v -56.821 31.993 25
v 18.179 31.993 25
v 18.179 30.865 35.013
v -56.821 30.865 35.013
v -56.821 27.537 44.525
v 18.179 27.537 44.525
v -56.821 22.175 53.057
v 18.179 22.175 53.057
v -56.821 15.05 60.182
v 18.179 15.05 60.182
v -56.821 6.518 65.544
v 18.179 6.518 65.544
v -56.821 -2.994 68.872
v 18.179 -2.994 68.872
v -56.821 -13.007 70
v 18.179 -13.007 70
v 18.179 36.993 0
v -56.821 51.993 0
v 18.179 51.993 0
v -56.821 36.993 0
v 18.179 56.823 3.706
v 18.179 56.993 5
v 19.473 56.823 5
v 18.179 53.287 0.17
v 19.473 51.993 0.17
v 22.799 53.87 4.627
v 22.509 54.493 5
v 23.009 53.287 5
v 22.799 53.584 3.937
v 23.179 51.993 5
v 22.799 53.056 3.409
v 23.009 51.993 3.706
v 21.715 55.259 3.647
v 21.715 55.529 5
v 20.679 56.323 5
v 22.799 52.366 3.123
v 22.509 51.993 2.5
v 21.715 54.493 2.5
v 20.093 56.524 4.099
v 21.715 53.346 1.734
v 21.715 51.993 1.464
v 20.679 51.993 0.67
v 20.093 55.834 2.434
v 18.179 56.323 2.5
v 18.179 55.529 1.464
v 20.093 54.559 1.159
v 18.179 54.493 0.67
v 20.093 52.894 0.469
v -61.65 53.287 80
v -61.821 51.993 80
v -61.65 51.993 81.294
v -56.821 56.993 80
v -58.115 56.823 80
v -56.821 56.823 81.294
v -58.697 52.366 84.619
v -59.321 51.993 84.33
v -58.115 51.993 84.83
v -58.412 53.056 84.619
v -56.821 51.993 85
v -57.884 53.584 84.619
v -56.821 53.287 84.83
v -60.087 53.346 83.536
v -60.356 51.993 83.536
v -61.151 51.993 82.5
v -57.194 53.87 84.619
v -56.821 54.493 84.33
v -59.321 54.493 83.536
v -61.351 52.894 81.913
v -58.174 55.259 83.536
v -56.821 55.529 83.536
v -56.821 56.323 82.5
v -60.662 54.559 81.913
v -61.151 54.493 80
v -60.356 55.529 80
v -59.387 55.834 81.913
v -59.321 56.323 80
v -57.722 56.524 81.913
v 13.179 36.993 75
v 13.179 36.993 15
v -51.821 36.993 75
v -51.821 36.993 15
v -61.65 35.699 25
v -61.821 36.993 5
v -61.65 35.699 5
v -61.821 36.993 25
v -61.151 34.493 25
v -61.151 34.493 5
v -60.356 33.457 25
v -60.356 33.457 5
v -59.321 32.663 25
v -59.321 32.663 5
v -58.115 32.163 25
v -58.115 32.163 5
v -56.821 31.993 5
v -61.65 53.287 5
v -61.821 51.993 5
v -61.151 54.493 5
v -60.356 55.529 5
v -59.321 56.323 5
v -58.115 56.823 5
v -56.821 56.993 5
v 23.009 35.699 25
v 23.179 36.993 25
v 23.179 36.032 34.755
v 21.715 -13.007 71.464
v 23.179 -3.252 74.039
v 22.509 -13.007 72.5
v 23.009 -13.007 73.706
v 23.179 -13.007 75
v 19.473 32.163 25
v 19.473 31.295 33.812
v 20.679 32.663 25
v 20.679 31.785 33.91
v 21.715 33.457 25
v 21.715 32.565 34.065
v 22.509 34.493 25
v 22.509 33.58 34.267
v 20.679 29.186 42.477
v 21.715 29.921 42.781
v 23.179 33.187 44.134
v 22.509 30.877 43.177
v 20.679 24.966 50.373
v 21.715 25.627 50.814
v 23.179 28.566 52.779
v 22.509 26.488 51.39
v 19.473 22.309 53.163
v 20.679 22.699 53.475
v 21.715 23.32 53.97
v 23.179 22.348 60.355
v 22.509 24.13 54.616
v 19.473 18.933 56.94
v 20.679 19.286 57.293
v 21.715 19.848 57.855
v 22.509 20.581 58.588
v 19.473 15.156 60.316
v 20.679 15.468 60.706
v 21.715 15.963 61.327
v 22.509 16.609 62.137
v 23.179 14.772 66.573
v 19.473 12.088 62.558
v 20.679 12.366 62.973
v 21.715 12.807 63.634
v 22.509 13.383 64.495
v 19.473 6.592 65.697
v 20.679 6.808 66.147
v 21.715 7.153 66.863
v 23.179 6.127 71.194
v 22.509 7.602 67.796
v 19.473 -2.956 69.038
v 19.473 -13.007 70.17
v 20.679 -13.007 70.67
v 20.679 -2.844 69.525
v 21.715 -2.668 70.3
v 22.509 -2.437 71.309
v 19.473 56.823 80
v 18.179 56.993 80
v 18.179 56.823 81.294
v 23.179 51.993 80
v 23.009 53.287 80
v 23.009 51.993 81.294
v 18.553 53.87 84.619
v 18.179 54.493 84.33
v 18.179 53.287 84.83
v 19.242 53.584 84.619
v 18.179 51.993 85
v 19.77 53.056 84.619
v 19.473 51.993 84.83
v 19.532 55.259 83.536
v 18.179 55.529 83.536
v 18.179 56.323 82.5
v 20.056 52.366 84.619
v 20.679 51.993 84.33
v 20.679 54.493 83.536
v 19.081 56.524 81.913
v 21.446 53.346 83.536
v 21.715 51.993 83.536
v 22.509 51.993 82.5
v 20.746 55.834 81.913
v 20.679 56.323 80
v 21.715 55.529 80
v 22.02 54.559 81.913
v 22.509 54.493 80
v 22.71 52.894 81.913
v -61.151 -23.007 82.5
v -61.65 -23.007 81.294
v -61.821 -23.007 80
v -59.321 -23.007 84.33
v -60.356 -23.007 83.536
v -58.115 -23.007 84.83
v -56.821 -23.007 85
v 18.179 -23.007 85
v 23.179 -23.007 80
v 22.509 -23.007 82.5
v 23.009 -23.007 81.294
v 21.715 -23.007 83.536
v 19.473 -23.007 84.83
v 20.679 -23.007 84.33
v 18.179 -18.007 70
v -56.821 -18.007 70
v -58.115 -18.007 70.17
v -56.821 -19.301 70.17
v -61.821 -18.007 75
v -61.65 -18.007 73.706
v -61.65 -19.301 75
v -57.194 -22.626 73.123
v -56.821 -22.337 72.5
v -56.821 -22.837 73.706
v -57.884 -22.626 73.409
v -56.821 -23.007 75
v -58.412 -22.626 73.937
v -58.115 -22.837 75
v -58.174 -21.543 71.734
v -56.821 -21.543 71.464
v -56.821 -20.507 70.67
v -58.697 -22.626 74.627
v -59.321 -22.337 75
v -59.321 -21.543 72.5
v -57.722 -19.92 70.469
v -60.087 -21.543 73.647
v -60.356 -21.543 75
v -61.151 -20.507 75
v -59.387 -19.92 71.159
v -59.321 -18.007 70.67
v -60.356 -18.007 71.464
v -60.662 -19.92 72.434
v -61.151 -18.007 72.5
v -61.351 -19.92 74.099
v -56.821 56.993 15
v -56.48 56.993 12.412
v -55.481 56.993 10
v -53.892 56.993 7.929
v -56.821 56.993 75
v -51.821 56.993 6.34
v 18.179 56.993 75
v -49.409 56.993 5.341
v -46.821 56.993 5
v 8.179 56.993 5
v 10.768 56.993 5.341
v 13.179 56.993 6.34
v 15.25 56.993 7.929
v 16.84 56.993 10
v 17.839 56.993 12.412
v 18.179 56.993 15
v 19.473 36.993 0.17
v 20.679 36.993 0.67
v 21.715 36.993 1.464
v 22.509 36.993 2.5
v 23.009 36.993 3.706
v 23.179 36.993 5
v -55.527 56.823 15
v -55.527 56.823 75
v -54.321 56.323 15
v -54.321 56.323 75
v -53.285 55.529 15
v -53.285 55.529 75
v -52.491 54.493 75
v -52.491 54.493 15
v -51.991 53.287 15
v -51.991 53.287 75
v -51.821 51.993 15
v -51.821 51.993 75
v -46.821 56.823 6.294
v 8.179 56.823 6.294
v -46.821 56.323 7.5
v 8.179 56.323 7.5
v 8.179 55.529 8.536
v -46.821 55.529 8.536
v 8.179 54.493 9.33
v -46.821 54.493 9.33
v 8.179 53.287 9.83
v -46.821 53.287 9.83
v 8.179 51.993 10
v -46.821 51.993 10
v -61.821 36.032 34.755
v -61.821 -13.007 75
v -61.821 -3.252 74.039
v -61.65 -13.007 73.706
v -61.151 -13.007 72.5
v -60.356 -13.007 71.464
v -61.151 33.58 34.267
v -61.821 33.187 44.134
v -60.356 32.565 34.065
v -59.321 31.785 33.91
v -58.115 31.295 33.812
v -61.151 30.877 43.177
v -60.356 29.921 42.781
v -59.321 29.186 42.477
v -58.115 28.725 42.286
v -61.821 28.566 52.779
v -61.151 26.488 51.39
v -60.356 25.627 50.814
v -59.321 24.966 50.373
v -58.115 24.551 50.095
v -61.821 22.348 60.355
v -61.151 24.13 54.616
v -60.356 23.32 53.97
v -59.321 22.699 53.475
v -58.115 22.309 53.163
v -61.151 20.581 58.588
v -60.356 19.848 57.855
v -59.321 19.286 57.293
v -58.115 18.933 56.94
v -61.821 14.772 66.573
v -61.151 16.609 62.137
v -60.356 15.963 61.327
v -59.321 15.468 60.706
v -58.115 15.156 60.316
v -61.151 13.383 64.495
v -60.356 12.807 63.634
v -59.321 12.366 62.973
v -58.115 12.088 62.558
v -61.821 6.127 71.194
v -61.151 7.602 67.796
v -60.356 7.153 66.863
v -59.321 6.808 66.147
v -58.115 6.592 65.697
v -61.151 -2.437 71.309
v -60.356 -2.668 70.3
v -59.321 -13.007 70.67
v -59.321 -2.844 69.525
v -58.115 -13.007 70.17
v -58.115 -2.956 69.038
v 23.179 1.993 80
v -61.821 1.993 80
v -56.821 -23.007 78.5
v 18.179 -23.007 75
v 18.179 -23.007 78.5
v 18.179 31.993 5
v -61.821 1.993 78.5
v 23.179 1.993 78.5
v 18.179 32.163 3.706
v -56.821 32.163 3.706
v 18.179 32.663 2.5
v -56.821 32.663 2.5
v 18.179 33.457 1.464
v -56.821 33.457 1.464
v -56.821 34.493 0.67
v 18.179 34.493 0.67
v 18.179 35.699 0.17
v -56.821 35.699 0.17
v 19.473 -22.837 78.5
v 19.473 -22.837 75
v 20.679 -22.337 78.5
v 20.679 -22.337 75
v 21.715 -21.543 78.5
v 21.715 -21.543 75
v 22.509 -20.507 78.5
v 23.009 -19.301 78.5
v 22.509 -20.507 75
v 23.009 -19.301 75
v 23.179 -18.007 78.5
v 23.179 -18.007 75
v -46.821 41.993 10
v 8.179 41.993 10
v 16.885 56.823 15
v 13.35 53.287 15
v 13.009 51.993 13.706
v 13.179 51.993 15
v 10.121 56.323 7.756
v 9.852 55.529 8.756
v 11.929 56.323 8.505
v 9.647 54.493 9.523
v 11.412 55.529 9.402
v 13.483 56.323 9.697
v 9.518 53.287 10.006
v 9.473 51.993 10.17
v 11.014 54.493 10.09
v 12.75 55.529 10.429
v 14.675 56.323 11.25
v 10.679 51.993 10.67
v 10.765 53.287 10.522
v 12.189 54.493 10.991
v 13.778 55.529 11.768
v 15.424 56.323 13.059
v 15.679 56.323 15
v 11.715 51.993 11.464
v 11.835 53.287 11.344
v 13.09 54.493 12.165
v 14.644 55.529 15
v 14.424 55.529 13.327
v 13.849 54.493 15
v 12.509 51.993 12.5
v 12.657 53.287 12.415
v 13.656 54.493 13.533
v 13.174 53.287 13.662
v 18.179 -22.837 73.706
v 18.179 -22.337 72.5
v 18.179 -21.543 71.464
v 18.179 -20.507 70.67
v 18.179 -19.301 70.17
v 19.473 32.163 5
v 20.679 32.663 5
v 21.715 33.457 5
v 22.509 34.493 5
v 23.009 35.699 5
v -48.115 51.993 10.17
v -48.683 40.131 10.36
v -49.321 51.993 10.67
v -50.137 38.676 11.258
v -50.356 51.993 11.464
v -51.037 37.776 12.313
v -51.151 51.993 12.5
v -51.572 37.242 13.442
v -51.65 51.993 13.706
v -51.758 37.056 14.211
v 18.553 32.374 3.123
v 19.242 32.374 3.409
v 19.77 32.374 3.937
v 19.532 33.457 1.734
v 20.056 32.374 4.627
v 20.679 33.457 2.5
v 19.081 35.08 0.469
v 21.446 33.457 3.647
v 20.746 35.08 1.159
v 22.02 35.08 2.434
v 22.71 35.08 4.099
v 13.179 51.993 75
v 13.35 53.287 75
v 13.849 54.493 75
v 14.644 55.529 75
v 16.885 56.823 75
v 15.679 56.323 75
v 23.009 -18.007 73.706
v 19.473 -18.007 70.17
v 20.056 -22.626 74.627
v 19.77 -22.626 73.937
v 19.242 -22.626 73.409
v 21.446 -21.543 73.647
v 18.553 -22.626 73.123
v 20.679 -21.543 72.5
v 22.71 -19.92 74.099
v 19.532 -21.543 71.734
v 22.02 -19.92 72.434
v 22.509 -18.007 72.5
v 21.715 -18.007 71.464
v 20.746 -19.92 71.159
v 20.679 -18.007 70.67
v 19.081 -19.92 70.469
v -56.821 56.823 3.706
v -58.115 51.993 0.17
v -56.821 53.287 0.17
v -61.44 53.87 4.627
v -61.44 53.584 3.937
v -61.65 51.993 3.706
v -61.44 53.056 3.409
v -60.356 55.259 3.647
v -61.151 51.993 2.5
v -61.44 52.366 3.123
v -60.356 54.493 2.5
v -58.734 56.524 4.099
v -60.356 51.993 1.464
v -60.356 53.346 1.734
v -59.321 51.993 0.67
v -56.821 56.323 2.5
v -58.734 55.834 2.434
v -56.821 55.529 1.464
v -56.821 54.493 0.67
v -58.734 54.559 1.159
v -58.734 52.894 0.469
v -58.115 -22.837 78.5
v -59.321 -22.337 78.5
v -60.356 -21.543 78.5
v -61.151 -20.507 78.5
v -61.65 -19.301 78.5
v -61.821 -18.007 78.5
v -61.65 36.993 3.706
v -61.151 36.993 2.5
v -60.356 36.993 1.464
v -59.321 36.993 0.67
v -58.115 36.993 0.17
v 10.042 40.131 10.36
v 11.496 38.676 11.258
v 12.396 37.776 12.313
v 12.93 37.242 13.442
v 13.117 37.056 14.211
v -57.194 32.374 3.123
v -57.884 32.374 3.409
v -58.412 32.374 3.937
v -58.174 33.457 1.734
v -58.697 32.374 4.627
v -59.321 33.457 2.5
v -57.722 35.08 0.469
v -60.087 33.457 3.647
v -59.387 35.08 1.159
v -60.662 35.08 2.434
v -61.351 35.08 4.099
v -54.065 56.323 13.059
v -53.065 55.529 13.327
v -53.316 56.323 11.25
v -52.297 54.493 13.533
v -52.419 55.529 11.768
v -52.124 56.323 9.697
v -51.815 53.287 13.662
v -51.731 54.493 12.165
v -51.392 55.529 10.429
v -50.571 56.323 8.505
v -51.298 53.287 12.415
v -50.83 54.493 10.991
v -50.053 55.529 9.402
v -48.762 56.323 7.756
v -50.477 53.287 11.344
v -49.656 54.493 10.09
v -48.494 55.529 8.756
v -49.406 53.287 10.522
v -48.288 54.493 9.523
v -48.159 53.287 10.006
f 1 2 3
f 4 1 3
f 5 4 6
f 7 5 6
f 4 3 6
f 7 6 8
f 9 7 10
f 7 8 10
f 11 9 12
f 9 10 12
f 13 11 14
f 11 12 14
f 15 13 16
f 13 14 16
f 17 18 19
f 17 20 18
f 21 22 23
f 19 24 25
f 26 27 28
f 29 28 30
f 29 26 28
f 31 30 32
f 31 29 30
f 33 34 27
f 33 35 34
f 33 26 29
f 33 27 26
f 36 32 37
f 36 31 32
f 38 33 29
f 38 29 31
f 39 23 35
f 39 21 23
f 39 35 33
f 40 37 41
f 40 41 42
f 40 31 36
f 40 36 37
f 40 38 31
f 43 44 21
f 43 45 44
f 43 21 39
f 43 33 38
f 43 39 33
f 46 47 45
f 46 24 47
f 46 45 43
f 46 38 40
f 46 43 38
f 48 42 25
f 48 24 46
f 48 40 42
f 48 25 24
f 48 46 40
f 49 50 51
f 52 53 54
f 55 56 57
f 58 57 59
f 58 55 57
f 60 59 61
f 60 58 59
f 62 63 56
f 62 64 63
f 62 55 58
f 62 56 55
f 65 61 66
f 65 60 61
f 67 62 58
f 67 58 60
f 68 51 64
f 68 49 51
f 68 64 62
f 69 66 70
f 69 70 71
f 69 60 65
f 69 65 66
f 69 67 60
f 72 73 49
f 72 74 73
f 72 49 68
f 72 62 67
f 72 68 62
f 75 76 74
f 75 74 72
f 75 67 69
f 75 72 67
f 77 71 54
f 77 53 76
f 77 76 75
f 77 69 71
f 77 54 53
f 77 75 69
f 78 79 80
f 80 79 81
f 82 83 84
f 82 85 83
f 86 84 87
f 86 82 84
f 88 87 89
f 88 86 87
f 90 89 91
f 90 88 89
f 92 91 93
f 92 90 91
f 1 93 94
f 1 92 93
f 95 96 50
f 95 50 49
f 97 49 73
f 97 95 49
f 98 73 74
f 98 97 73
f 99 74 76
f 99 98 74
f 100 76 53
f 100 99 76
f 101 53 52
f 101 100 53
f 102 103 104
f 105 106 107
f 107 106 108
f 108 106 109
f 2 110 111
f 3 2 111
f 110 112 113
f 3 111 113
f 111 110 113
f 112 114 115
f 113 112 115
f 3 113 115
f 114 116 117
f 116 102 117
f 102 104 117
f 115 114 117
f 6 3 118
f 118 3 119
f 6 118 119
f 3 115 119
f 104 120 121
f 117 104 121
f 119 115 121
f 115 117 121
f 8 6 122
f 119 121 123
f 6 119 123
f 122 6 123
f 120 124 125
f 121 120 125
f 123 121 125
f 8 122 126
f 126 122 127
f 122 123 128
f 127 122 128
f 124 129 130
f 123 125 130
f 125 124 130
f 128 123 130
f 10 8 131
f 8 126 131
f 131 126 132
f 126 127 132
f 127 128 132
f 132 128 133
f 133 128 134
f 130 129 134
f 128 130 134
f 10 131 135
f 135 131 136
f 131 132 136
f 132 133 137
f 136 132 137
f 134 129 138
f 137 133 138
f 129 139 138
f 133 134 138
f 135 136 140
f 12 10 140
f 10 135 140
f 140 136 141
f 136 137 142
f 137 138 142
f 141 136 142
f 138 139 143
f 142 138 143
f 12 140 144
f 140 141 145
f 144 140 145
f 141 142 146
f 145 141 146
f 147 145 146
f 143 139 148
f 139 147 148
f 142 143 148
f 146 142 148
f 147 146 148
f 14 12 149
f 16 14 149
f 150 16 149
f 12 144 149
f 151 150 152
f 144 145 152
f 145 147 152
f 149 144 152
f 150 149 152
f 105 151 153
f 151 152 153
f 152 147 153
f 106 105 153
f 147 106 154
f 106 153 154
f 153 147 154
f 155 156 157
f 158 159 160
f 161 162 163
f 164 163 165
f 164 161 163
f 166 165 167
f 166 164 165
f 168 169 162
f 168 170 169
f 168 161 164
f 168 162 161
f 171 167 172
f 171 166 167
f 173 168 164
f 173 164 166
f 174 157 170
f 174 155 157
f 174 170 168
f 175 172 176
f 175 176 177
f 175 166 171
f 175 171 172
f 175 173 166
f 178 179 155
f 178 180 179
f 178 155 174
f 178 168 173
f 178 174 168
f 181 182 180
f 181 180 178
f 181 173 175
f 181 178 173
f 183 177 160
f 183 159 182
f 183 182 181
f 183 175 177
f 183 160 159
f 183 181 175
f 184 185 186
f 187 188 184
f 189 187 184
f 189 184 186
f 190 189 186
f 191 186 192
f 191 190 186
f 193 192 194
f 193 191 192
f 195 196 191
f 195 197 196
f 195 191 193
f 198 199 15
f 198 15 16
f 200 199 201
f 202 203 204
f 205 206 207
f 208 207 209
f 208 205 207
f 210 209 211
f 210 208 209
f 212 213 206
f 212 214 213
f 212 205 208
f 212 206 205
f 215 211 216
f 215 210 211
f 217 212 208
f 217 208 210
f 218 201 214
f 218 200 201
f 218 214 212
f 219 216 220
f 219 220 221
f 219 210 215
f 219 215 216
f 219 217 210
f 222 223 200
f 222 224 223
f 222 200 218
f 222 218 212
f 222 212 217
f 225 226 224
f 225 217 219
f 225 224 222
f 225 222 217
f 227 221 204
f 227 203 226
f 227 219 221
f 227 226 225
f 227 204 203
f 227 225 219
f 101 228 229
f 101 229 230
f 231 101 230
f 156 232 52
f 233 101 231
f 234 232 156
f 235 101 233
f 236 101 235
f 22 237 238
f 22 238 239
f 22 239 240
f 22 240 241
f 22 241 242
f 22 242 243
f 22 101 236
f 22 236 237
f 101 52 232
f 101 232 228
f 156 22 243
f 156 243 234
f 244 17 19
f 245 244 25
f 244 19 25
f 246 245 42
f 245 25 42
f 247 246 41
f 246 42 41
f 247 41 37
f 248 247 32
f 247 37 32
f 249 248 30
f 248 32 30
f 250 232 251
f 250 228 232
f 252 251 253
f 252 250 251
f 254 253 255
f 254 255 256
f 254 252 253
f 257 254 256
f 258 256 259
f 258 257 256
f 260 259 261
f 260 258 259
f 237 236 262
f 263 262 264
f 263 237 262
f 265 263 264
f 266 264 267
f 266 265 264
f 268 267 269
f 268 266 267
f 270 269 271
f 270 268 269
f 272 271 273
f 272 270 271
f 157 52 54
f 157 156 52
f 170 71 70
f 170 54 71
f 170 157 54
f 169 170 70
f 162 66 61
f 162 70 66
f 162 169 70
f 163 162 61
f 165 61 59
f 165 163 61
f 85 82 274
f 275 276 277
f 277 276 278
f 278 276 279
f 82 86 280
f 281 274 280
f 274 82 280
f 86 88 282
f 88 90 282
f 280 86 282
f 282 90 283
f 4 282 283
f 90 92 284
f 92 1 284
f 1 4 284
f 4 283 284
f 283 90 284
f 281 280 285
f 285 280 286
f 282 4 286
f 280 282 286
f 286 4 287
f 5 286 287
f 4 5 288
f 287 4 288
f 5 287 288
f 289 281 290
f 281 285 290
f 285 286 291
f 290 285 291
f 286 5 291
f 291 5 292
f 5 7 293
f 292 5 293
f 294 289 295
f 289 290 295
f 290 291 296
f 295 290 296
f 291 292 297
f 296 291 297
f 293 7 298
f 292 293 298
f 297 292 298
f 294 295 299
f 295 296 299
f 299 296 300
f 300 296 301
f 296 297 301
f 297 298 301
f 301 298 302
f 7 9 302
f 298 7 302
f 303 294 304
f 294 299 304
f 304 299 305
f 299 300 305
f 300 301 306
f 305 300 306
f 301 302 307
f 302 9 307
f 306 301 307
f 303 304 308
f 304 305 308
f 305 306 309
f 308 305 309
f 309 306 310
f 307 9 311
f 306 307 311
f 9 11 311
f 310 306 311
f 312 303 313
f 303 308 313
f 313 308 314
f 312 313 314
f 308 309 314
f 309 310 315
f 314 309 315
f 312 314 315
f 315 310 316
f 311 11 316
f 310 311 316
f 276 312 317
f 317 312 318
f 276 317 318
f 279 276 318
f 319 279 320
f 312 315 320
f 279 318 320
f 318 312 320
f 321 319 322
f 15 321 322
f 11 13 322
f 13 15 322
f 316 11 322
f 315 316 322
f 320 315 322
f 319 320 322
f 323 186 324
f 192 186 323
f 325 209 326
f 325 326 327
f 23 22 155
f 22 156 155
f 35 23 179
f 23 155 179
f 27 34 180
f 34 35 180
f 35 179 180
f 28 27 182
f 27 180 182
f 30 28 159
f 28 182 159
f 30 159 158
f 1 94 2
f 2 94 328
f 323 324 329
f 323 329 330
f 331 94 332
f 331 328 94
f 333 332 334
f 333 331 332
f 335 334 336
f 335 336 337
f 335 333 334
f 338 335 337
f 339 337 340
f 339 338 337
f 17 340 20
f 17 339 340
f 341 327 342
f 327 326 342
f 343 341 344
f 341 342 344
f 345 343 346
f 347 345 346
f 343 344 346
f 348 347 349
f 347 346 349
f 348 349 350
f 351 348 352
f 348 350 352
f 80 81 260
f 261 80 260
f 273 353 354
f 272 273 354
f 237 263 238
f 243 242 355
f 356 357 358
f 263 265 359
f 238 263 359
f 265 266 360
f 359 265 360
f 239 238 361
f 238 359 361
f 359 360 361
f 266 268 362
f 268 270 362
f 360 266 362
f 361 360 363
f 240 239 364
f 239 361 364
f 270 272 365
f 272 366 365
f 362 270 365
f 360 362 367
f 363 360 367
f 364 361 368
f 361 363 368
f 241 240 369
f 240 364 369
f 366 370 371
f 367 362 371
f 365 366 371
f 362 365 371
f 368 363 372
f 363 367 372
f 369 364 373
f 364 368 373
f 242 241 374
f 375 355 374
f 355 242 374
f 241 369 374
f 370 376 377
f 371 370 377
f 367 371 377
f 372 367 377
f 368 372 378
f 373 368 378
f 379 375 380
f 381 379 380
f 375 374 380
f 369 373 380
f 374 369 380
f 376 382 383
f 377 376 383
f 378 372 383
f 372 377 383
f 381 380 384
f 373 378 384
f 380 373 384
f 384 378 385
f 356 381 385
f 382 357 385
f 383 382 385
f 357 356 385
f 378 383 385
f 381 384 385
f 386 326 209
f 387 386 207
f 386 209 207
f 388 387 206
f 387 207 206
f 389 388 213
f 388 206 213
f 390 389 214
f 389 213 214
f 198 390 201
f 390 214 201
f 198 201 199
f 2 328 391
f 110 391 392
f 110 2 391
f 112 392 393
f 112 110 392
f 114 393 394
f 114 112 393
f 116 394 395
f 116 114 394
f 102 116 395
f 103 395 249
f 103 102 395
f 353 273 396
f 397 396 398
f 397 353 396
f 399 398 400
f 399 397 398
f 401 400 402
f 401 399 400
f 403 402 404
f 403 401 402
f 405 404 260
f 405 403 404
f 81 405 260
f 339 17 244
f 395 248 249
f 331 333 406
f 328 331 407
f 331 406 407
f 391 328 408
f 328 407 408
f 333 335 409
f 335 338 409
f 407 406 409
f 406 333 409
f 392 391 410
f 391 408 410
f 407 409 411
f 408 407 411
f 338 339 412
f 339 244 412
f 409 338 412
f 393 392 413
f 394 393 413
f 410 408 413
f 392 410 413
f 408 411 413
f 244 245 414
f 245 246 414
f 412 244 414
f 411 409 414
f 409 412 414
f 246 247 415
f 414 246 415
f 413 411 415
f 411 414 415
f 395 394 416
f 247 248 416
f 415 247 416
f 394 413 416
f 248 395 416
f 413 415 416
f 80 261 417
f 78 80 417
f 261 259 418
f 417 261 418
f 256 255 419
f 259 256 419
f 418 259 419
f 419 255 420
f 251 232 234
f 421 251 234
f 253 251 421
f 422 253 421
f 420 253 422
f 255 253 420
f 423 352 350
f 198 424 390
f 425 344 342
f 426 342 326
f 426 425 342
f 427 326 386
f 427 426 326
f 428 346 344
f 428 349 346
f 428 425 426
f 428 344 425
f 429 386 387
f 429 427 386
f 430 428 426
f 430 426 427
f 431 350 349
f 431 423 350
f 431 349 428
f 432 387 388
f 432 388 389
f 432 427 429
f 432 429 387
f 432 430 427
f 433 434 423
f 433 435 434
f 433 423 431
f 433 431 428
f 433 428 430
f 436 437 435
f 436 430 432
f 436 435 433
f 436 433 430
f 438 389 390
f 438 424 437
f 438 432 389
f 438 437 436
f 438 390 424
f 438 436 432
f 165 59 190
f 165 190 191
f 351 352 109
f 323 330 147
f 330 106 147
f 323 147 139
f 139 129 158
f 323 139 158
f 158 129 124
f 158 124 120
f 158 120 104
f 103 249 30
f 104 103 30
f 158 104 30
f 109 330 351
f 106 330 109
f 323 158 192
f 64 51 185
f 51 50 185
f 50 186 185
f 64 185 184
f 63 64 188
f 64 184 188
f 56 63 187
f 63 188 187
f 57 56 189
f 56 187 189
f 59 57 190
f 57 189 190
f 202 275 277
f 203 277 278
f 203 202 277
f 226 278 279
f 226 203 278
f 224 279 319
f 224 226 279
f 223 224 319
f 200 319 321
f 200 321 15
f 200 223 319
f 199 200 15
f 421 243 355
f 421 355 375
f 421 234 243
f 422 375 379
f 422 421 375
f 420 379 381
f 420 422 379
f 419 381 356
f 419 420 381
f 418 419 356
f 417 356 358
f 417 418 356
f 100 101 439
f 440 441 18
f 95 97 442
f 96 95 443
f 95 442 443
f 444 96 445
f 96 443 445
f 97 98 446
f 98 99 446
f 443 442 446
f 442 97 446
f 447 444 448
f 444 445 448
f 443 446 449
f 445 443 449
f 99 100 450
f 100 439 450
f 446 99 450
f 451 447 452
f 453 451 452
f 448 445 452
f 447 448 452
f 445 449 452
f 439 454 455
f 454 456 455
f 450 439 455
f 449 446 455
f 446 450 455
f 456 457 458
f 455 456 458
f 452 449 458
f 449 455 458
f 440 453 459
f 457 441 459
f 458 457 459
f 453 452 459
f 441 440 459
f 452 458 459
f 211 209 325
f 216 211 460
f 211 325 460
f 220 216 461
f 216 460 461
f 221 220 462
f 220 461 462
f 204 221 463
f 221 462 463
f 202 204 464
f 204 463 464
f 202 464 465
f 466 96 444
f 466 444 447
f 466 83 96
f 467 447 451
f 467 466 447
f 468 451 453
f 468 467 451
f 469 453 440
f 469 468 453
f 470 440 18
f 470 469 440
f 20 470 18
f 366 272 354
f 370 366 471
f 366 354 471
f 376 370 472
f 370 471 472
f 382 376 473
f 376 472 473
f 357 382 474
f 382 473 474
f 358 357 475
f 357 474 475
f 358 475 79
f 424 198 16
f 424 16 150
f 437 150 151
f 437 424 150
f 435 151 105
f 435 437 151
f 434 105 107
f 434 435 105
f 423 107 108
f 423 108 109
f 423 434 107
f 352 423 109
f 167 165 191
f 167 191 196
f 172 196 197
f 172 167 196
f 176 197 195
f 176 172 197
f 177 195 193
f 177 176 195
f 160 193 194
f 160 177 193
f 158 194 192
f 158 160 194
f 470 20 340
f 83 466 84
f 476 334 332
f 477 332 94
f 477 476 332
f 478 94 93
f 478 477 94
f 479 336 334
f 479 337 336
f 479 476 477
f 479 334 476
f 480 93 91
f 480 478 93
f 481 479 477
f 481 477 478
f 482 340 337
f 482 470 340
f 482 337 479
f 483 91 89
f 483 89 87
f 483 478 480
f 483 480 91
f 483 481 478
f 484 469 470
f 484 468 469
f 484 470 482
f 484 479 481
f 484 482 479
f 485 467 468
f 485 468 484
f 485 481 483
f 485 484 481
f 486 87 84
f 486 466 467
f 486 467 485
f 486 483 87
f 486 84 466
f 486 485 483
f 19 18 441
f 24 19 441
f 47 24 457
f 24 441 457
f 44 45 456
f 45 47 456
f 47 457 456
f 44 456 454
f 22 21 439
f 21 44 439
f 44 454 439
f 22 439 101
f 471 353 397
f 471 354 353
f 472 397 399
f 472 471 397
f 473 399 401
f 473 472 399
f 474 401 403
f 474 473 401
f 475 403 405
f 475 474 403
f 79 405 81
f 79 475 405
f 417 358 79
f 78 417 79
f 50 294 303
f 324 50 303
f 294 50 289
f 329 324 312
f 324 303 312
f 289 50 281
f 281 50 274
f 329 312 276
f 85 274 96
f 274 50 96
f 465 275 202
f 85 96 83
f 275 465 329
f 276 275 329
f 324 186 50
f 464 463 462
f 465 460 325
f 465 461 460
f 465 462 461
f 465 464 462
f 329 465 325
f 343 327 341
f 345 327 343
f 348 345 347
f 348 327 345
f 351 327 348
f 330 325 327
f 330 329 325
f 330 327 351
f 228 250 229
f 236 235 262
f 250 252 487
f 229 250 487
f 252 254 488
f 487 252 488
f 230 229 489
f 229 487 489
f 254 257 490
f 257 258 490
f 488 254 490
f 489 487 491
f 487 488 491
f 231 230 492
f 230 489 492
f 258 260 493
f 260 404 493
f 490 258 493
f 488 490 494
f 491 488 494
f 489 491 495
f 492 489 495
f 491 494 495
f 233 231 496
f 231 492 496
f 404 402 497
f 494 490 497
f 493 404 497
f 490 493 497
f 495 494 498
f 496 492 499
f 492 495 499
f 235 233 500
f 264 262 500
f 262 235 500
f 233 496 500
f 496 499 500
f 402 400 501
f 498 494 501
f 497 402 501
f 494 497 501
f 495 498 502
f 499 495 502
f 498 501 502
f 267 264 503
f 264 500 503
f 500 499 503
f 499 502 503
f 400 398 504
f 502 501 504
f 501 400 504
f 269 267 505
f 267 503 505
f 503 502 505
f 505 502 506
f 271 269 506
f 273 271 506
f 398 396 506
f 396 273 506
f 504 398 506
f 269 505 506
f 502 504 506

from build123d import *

# Parameters (mm, degrees)
F1_DEPTH  = 60
F2_DEPTH  = 85
F3_W      = 65
F3_H      = 20
F4_DEPTH  = 10
F5_W      = 65
F5_H      = 20
F6_DEPTH  = 10
F9_W      = 85
F9_H      = 25
F10_DEPTH = 1.5
F11_F1_R  = 5
F11_F2_R  = 5
F12_W     = 85
F12_H     = 60
F13_DEPTH = 70
F14_R     = 45
F15_R     = 4.99999
F16_R     = 4.99999
F17_W     = 85
F17_H     = 1.5
F18_DEPTH = 5
F19_W     = 85
F19_H     = 5
F20_DEPTH = 5
F21_W     = 5
F21_H     = 10
F22_DEPTH = 85
F23_R     = 4.99999


# Not quite as in the source:
# - a fillet or chamfer is up to 0.001 mm smaller than in the source, because OpenCascade refuses the exact size


with BuildPart() as f1:
    # F0 (on Top) → F1 (new body)
    with BuildSketch(Plane.XY):
        Polygon((-61.8206309527, 56.9930104911), (-61.8206309527, -28.0069895089), (23.1793690473, -28.0069895089), (23.1793690473, 56.9930104911), (13.1793690473, 56.9930104911), (13.1793690473, 36.9930104911), (-51.8206309527, 36.9930104911), (-51.8206309527, 56.9930104911), align=None)
    extrude(amount=F1_DEPTH)

    # F0 (on Top) → F2 (join)
    with BuildSketch(Plane.XY):
        Polygon((-61.8206309527, 56.9930104911), (-61.8206309527, -28.0069895089), (23.1793690473, -28.0069895089), (23.1793690473, 56.9930104911), (13.1793690473, 56.9930104911), (13.1793690473, 36.9930104911), (-51.8206309527, 36.9930104911), (-51.8206309527, 56.9930104911), align=None)
    extrude(amount=F2_DEPTH)

    # F3 (on face) → F4 (join)
    with BuildSketch(Plane.XY.offset(85)):
        with Locations((-19.3206309527, 46.9930104911)):
            Rectangle(F3_W, F3_H)
    extrude(amount=-F4_DEPTH)

    # F5 (on face) → F6 (join)
    with BuildSketch(Plane(origin=(0, 0, 0), x_dir=(1, 0, 0), z_dir=(0, 0, -1))):
        with Locations((-19.3206309527, -46.9930104911)):
            Rectangle(F5_W, F5_H)
    extrude(amount=-F6_DEPTH)

    # F9 (on offset) → F10 (cut)
    with BuildSketch(Plane.XY.offset(80)):
        with Locations((-19.3206309527, -15.5069895089)):
            Rectangle(F9_W, F9_H)
    extrude(amount=-F10_DEPTH, mode=Mode.SUBTRACT)

    # F11: fillet of radius 5 on 4 edges, made by hand

    # F11_f1
    f11_f1_edges = [f1.edges().sort_by_distance(p)[0] for p in [
        (13.1793690473, 46.9930104911, 10),
        (-19.3206309527, 36.9930104911, 10),
        (-51.8206309527, 46.9930104911, 10),
    ]]
    fillet(f11_f1_edges, radius=F11_F1_R)

    # F11_f2
    f11_f2_edges = [f1.edges().sort_by_distance(p)[0] for p in [
        (-19.3206309527, 56.9930104911, 10),
        (-50.3561648586, 56.9930104911, 11.4644660941),
        (11.7149029532, 56.9930104911, 11.4644660941),
    ]]
    fillet(f11_f2_edges, radius=F11_F2_R)

    # F12 (on face) → F13 (cut)
    with BuildSketch(Plane(origin=(0, 0, 0), x_dir=(1, 0, 0), z_dir=(0, 0, -1))):
        with Locations((-19.3206309527, -1.9930104911)):
            Rectangle(F12_W, F12_H)
    extrude(amount=-F13_DEPTH, mode=Mode.SUBTRACT)

    # F14
    f14_edges = [f1.edges().sort_by_distance(p)[0] for p in [
        (-19.320631, 31.99301, 70),
    ]]
    fillet(f14_edges, radius=F14_R)

    # F15 (radius 5 in the source; OpenCascade refuses exactly that, so slightly less here)
    f15_edges = [f1.edges().sort_by_distance(p)[0] for p in [
        (-19.320631, 56.99301, 0),
        (-61.820631, 56.99301, 42.5),
        (23.179369, 56.99301, 42.5),
        (-61.820631, 44.49301, 0),
        (23.179369, 44.49301, 0),
        (-19.320631, 31.99301, 0),
        (-61.820631, -20.50699, 70),
        (23.179369, 18.812816, 56.819805),
        (-61.820631, 31.99301, 12.5),
        (-61.820631, 18.812816, 56.819805),
        (-61.820631, 14.49301, 85),
        (23.179369, 31.99301, 12.5),
        (23.179369, -20.50699, 70),
        (-19.320631, 56.99301, 85),
        (23.179369, 14.49301, 85),
    ]]
    fillet(f15_edges, radius=F15_R)

    # F16 (radius 5 in the source; OpenCascade refuses exactly that, so slightly less here)
    f16_edges = [f1.edges().sort_by_distance(p)[0] for p in [
        (-19.320631, 51.99302, 0),
        (18.179379, 44.49301, 0),
        (-56.820641, 44.49301, 0),
        (-19.320631, 36.993, 0),
        (-19.320631, -28.00699, 70),
    ]]
    fillet(f16_edges, radius=F16_R)

    # F17 (on face) → F18 (cut)
    with BuildSketch(Plane.XZ.offset(3.0069895089)):
        with Locations((-19.3206309527, 79.25)):
            Rectangle(F17_W, F17_H)
    extrude(amount=-F18_DEPTH, mode=Mode.SUBTRACT)

    # F19 (on face) → F20 (cut)
    with BuildSketch(Plane.XZ.offset(28.0069895089)):
        with Locations((-19.3206309527, 82.5)):
            Rectangle(F19_W, F19_H)
    extrude(amount=-F20_DEPTH, mode=Mode.SUBTRACT)

    # F21 (on face) → F22 (cut)
    with BuildSketch(Plane(origin=(-61.8206309527, 0, 0), x_dir=(0, -1, 0), z_dir=(-1, 0, 0))):
        with Locations((25.5069895089, 73.5)):
            Rectangle(F21_W, F21_H)
    extrude(amount=-F22_DEPTH, mode=Mode.SUBTRACT)

    # F23 (radius 5 in the source; OpenCascade refuses exactly that, so slightly less here)
    f23_edges = [f1.edges().sort_by_distance(p)[0] for p in [
        (-19.320631, -23.00699, 70),
        (-61.820631, -23.00699, 76.749995),
        (-60.356168, -23.00699, 71.464463),
        (21.714906, -23.00699, 71.464463),
        (23.179369, -23.00699, 76.749995),
    ]]
    fillet(f23_edges, radius=F23_R)


solid = f1.part
